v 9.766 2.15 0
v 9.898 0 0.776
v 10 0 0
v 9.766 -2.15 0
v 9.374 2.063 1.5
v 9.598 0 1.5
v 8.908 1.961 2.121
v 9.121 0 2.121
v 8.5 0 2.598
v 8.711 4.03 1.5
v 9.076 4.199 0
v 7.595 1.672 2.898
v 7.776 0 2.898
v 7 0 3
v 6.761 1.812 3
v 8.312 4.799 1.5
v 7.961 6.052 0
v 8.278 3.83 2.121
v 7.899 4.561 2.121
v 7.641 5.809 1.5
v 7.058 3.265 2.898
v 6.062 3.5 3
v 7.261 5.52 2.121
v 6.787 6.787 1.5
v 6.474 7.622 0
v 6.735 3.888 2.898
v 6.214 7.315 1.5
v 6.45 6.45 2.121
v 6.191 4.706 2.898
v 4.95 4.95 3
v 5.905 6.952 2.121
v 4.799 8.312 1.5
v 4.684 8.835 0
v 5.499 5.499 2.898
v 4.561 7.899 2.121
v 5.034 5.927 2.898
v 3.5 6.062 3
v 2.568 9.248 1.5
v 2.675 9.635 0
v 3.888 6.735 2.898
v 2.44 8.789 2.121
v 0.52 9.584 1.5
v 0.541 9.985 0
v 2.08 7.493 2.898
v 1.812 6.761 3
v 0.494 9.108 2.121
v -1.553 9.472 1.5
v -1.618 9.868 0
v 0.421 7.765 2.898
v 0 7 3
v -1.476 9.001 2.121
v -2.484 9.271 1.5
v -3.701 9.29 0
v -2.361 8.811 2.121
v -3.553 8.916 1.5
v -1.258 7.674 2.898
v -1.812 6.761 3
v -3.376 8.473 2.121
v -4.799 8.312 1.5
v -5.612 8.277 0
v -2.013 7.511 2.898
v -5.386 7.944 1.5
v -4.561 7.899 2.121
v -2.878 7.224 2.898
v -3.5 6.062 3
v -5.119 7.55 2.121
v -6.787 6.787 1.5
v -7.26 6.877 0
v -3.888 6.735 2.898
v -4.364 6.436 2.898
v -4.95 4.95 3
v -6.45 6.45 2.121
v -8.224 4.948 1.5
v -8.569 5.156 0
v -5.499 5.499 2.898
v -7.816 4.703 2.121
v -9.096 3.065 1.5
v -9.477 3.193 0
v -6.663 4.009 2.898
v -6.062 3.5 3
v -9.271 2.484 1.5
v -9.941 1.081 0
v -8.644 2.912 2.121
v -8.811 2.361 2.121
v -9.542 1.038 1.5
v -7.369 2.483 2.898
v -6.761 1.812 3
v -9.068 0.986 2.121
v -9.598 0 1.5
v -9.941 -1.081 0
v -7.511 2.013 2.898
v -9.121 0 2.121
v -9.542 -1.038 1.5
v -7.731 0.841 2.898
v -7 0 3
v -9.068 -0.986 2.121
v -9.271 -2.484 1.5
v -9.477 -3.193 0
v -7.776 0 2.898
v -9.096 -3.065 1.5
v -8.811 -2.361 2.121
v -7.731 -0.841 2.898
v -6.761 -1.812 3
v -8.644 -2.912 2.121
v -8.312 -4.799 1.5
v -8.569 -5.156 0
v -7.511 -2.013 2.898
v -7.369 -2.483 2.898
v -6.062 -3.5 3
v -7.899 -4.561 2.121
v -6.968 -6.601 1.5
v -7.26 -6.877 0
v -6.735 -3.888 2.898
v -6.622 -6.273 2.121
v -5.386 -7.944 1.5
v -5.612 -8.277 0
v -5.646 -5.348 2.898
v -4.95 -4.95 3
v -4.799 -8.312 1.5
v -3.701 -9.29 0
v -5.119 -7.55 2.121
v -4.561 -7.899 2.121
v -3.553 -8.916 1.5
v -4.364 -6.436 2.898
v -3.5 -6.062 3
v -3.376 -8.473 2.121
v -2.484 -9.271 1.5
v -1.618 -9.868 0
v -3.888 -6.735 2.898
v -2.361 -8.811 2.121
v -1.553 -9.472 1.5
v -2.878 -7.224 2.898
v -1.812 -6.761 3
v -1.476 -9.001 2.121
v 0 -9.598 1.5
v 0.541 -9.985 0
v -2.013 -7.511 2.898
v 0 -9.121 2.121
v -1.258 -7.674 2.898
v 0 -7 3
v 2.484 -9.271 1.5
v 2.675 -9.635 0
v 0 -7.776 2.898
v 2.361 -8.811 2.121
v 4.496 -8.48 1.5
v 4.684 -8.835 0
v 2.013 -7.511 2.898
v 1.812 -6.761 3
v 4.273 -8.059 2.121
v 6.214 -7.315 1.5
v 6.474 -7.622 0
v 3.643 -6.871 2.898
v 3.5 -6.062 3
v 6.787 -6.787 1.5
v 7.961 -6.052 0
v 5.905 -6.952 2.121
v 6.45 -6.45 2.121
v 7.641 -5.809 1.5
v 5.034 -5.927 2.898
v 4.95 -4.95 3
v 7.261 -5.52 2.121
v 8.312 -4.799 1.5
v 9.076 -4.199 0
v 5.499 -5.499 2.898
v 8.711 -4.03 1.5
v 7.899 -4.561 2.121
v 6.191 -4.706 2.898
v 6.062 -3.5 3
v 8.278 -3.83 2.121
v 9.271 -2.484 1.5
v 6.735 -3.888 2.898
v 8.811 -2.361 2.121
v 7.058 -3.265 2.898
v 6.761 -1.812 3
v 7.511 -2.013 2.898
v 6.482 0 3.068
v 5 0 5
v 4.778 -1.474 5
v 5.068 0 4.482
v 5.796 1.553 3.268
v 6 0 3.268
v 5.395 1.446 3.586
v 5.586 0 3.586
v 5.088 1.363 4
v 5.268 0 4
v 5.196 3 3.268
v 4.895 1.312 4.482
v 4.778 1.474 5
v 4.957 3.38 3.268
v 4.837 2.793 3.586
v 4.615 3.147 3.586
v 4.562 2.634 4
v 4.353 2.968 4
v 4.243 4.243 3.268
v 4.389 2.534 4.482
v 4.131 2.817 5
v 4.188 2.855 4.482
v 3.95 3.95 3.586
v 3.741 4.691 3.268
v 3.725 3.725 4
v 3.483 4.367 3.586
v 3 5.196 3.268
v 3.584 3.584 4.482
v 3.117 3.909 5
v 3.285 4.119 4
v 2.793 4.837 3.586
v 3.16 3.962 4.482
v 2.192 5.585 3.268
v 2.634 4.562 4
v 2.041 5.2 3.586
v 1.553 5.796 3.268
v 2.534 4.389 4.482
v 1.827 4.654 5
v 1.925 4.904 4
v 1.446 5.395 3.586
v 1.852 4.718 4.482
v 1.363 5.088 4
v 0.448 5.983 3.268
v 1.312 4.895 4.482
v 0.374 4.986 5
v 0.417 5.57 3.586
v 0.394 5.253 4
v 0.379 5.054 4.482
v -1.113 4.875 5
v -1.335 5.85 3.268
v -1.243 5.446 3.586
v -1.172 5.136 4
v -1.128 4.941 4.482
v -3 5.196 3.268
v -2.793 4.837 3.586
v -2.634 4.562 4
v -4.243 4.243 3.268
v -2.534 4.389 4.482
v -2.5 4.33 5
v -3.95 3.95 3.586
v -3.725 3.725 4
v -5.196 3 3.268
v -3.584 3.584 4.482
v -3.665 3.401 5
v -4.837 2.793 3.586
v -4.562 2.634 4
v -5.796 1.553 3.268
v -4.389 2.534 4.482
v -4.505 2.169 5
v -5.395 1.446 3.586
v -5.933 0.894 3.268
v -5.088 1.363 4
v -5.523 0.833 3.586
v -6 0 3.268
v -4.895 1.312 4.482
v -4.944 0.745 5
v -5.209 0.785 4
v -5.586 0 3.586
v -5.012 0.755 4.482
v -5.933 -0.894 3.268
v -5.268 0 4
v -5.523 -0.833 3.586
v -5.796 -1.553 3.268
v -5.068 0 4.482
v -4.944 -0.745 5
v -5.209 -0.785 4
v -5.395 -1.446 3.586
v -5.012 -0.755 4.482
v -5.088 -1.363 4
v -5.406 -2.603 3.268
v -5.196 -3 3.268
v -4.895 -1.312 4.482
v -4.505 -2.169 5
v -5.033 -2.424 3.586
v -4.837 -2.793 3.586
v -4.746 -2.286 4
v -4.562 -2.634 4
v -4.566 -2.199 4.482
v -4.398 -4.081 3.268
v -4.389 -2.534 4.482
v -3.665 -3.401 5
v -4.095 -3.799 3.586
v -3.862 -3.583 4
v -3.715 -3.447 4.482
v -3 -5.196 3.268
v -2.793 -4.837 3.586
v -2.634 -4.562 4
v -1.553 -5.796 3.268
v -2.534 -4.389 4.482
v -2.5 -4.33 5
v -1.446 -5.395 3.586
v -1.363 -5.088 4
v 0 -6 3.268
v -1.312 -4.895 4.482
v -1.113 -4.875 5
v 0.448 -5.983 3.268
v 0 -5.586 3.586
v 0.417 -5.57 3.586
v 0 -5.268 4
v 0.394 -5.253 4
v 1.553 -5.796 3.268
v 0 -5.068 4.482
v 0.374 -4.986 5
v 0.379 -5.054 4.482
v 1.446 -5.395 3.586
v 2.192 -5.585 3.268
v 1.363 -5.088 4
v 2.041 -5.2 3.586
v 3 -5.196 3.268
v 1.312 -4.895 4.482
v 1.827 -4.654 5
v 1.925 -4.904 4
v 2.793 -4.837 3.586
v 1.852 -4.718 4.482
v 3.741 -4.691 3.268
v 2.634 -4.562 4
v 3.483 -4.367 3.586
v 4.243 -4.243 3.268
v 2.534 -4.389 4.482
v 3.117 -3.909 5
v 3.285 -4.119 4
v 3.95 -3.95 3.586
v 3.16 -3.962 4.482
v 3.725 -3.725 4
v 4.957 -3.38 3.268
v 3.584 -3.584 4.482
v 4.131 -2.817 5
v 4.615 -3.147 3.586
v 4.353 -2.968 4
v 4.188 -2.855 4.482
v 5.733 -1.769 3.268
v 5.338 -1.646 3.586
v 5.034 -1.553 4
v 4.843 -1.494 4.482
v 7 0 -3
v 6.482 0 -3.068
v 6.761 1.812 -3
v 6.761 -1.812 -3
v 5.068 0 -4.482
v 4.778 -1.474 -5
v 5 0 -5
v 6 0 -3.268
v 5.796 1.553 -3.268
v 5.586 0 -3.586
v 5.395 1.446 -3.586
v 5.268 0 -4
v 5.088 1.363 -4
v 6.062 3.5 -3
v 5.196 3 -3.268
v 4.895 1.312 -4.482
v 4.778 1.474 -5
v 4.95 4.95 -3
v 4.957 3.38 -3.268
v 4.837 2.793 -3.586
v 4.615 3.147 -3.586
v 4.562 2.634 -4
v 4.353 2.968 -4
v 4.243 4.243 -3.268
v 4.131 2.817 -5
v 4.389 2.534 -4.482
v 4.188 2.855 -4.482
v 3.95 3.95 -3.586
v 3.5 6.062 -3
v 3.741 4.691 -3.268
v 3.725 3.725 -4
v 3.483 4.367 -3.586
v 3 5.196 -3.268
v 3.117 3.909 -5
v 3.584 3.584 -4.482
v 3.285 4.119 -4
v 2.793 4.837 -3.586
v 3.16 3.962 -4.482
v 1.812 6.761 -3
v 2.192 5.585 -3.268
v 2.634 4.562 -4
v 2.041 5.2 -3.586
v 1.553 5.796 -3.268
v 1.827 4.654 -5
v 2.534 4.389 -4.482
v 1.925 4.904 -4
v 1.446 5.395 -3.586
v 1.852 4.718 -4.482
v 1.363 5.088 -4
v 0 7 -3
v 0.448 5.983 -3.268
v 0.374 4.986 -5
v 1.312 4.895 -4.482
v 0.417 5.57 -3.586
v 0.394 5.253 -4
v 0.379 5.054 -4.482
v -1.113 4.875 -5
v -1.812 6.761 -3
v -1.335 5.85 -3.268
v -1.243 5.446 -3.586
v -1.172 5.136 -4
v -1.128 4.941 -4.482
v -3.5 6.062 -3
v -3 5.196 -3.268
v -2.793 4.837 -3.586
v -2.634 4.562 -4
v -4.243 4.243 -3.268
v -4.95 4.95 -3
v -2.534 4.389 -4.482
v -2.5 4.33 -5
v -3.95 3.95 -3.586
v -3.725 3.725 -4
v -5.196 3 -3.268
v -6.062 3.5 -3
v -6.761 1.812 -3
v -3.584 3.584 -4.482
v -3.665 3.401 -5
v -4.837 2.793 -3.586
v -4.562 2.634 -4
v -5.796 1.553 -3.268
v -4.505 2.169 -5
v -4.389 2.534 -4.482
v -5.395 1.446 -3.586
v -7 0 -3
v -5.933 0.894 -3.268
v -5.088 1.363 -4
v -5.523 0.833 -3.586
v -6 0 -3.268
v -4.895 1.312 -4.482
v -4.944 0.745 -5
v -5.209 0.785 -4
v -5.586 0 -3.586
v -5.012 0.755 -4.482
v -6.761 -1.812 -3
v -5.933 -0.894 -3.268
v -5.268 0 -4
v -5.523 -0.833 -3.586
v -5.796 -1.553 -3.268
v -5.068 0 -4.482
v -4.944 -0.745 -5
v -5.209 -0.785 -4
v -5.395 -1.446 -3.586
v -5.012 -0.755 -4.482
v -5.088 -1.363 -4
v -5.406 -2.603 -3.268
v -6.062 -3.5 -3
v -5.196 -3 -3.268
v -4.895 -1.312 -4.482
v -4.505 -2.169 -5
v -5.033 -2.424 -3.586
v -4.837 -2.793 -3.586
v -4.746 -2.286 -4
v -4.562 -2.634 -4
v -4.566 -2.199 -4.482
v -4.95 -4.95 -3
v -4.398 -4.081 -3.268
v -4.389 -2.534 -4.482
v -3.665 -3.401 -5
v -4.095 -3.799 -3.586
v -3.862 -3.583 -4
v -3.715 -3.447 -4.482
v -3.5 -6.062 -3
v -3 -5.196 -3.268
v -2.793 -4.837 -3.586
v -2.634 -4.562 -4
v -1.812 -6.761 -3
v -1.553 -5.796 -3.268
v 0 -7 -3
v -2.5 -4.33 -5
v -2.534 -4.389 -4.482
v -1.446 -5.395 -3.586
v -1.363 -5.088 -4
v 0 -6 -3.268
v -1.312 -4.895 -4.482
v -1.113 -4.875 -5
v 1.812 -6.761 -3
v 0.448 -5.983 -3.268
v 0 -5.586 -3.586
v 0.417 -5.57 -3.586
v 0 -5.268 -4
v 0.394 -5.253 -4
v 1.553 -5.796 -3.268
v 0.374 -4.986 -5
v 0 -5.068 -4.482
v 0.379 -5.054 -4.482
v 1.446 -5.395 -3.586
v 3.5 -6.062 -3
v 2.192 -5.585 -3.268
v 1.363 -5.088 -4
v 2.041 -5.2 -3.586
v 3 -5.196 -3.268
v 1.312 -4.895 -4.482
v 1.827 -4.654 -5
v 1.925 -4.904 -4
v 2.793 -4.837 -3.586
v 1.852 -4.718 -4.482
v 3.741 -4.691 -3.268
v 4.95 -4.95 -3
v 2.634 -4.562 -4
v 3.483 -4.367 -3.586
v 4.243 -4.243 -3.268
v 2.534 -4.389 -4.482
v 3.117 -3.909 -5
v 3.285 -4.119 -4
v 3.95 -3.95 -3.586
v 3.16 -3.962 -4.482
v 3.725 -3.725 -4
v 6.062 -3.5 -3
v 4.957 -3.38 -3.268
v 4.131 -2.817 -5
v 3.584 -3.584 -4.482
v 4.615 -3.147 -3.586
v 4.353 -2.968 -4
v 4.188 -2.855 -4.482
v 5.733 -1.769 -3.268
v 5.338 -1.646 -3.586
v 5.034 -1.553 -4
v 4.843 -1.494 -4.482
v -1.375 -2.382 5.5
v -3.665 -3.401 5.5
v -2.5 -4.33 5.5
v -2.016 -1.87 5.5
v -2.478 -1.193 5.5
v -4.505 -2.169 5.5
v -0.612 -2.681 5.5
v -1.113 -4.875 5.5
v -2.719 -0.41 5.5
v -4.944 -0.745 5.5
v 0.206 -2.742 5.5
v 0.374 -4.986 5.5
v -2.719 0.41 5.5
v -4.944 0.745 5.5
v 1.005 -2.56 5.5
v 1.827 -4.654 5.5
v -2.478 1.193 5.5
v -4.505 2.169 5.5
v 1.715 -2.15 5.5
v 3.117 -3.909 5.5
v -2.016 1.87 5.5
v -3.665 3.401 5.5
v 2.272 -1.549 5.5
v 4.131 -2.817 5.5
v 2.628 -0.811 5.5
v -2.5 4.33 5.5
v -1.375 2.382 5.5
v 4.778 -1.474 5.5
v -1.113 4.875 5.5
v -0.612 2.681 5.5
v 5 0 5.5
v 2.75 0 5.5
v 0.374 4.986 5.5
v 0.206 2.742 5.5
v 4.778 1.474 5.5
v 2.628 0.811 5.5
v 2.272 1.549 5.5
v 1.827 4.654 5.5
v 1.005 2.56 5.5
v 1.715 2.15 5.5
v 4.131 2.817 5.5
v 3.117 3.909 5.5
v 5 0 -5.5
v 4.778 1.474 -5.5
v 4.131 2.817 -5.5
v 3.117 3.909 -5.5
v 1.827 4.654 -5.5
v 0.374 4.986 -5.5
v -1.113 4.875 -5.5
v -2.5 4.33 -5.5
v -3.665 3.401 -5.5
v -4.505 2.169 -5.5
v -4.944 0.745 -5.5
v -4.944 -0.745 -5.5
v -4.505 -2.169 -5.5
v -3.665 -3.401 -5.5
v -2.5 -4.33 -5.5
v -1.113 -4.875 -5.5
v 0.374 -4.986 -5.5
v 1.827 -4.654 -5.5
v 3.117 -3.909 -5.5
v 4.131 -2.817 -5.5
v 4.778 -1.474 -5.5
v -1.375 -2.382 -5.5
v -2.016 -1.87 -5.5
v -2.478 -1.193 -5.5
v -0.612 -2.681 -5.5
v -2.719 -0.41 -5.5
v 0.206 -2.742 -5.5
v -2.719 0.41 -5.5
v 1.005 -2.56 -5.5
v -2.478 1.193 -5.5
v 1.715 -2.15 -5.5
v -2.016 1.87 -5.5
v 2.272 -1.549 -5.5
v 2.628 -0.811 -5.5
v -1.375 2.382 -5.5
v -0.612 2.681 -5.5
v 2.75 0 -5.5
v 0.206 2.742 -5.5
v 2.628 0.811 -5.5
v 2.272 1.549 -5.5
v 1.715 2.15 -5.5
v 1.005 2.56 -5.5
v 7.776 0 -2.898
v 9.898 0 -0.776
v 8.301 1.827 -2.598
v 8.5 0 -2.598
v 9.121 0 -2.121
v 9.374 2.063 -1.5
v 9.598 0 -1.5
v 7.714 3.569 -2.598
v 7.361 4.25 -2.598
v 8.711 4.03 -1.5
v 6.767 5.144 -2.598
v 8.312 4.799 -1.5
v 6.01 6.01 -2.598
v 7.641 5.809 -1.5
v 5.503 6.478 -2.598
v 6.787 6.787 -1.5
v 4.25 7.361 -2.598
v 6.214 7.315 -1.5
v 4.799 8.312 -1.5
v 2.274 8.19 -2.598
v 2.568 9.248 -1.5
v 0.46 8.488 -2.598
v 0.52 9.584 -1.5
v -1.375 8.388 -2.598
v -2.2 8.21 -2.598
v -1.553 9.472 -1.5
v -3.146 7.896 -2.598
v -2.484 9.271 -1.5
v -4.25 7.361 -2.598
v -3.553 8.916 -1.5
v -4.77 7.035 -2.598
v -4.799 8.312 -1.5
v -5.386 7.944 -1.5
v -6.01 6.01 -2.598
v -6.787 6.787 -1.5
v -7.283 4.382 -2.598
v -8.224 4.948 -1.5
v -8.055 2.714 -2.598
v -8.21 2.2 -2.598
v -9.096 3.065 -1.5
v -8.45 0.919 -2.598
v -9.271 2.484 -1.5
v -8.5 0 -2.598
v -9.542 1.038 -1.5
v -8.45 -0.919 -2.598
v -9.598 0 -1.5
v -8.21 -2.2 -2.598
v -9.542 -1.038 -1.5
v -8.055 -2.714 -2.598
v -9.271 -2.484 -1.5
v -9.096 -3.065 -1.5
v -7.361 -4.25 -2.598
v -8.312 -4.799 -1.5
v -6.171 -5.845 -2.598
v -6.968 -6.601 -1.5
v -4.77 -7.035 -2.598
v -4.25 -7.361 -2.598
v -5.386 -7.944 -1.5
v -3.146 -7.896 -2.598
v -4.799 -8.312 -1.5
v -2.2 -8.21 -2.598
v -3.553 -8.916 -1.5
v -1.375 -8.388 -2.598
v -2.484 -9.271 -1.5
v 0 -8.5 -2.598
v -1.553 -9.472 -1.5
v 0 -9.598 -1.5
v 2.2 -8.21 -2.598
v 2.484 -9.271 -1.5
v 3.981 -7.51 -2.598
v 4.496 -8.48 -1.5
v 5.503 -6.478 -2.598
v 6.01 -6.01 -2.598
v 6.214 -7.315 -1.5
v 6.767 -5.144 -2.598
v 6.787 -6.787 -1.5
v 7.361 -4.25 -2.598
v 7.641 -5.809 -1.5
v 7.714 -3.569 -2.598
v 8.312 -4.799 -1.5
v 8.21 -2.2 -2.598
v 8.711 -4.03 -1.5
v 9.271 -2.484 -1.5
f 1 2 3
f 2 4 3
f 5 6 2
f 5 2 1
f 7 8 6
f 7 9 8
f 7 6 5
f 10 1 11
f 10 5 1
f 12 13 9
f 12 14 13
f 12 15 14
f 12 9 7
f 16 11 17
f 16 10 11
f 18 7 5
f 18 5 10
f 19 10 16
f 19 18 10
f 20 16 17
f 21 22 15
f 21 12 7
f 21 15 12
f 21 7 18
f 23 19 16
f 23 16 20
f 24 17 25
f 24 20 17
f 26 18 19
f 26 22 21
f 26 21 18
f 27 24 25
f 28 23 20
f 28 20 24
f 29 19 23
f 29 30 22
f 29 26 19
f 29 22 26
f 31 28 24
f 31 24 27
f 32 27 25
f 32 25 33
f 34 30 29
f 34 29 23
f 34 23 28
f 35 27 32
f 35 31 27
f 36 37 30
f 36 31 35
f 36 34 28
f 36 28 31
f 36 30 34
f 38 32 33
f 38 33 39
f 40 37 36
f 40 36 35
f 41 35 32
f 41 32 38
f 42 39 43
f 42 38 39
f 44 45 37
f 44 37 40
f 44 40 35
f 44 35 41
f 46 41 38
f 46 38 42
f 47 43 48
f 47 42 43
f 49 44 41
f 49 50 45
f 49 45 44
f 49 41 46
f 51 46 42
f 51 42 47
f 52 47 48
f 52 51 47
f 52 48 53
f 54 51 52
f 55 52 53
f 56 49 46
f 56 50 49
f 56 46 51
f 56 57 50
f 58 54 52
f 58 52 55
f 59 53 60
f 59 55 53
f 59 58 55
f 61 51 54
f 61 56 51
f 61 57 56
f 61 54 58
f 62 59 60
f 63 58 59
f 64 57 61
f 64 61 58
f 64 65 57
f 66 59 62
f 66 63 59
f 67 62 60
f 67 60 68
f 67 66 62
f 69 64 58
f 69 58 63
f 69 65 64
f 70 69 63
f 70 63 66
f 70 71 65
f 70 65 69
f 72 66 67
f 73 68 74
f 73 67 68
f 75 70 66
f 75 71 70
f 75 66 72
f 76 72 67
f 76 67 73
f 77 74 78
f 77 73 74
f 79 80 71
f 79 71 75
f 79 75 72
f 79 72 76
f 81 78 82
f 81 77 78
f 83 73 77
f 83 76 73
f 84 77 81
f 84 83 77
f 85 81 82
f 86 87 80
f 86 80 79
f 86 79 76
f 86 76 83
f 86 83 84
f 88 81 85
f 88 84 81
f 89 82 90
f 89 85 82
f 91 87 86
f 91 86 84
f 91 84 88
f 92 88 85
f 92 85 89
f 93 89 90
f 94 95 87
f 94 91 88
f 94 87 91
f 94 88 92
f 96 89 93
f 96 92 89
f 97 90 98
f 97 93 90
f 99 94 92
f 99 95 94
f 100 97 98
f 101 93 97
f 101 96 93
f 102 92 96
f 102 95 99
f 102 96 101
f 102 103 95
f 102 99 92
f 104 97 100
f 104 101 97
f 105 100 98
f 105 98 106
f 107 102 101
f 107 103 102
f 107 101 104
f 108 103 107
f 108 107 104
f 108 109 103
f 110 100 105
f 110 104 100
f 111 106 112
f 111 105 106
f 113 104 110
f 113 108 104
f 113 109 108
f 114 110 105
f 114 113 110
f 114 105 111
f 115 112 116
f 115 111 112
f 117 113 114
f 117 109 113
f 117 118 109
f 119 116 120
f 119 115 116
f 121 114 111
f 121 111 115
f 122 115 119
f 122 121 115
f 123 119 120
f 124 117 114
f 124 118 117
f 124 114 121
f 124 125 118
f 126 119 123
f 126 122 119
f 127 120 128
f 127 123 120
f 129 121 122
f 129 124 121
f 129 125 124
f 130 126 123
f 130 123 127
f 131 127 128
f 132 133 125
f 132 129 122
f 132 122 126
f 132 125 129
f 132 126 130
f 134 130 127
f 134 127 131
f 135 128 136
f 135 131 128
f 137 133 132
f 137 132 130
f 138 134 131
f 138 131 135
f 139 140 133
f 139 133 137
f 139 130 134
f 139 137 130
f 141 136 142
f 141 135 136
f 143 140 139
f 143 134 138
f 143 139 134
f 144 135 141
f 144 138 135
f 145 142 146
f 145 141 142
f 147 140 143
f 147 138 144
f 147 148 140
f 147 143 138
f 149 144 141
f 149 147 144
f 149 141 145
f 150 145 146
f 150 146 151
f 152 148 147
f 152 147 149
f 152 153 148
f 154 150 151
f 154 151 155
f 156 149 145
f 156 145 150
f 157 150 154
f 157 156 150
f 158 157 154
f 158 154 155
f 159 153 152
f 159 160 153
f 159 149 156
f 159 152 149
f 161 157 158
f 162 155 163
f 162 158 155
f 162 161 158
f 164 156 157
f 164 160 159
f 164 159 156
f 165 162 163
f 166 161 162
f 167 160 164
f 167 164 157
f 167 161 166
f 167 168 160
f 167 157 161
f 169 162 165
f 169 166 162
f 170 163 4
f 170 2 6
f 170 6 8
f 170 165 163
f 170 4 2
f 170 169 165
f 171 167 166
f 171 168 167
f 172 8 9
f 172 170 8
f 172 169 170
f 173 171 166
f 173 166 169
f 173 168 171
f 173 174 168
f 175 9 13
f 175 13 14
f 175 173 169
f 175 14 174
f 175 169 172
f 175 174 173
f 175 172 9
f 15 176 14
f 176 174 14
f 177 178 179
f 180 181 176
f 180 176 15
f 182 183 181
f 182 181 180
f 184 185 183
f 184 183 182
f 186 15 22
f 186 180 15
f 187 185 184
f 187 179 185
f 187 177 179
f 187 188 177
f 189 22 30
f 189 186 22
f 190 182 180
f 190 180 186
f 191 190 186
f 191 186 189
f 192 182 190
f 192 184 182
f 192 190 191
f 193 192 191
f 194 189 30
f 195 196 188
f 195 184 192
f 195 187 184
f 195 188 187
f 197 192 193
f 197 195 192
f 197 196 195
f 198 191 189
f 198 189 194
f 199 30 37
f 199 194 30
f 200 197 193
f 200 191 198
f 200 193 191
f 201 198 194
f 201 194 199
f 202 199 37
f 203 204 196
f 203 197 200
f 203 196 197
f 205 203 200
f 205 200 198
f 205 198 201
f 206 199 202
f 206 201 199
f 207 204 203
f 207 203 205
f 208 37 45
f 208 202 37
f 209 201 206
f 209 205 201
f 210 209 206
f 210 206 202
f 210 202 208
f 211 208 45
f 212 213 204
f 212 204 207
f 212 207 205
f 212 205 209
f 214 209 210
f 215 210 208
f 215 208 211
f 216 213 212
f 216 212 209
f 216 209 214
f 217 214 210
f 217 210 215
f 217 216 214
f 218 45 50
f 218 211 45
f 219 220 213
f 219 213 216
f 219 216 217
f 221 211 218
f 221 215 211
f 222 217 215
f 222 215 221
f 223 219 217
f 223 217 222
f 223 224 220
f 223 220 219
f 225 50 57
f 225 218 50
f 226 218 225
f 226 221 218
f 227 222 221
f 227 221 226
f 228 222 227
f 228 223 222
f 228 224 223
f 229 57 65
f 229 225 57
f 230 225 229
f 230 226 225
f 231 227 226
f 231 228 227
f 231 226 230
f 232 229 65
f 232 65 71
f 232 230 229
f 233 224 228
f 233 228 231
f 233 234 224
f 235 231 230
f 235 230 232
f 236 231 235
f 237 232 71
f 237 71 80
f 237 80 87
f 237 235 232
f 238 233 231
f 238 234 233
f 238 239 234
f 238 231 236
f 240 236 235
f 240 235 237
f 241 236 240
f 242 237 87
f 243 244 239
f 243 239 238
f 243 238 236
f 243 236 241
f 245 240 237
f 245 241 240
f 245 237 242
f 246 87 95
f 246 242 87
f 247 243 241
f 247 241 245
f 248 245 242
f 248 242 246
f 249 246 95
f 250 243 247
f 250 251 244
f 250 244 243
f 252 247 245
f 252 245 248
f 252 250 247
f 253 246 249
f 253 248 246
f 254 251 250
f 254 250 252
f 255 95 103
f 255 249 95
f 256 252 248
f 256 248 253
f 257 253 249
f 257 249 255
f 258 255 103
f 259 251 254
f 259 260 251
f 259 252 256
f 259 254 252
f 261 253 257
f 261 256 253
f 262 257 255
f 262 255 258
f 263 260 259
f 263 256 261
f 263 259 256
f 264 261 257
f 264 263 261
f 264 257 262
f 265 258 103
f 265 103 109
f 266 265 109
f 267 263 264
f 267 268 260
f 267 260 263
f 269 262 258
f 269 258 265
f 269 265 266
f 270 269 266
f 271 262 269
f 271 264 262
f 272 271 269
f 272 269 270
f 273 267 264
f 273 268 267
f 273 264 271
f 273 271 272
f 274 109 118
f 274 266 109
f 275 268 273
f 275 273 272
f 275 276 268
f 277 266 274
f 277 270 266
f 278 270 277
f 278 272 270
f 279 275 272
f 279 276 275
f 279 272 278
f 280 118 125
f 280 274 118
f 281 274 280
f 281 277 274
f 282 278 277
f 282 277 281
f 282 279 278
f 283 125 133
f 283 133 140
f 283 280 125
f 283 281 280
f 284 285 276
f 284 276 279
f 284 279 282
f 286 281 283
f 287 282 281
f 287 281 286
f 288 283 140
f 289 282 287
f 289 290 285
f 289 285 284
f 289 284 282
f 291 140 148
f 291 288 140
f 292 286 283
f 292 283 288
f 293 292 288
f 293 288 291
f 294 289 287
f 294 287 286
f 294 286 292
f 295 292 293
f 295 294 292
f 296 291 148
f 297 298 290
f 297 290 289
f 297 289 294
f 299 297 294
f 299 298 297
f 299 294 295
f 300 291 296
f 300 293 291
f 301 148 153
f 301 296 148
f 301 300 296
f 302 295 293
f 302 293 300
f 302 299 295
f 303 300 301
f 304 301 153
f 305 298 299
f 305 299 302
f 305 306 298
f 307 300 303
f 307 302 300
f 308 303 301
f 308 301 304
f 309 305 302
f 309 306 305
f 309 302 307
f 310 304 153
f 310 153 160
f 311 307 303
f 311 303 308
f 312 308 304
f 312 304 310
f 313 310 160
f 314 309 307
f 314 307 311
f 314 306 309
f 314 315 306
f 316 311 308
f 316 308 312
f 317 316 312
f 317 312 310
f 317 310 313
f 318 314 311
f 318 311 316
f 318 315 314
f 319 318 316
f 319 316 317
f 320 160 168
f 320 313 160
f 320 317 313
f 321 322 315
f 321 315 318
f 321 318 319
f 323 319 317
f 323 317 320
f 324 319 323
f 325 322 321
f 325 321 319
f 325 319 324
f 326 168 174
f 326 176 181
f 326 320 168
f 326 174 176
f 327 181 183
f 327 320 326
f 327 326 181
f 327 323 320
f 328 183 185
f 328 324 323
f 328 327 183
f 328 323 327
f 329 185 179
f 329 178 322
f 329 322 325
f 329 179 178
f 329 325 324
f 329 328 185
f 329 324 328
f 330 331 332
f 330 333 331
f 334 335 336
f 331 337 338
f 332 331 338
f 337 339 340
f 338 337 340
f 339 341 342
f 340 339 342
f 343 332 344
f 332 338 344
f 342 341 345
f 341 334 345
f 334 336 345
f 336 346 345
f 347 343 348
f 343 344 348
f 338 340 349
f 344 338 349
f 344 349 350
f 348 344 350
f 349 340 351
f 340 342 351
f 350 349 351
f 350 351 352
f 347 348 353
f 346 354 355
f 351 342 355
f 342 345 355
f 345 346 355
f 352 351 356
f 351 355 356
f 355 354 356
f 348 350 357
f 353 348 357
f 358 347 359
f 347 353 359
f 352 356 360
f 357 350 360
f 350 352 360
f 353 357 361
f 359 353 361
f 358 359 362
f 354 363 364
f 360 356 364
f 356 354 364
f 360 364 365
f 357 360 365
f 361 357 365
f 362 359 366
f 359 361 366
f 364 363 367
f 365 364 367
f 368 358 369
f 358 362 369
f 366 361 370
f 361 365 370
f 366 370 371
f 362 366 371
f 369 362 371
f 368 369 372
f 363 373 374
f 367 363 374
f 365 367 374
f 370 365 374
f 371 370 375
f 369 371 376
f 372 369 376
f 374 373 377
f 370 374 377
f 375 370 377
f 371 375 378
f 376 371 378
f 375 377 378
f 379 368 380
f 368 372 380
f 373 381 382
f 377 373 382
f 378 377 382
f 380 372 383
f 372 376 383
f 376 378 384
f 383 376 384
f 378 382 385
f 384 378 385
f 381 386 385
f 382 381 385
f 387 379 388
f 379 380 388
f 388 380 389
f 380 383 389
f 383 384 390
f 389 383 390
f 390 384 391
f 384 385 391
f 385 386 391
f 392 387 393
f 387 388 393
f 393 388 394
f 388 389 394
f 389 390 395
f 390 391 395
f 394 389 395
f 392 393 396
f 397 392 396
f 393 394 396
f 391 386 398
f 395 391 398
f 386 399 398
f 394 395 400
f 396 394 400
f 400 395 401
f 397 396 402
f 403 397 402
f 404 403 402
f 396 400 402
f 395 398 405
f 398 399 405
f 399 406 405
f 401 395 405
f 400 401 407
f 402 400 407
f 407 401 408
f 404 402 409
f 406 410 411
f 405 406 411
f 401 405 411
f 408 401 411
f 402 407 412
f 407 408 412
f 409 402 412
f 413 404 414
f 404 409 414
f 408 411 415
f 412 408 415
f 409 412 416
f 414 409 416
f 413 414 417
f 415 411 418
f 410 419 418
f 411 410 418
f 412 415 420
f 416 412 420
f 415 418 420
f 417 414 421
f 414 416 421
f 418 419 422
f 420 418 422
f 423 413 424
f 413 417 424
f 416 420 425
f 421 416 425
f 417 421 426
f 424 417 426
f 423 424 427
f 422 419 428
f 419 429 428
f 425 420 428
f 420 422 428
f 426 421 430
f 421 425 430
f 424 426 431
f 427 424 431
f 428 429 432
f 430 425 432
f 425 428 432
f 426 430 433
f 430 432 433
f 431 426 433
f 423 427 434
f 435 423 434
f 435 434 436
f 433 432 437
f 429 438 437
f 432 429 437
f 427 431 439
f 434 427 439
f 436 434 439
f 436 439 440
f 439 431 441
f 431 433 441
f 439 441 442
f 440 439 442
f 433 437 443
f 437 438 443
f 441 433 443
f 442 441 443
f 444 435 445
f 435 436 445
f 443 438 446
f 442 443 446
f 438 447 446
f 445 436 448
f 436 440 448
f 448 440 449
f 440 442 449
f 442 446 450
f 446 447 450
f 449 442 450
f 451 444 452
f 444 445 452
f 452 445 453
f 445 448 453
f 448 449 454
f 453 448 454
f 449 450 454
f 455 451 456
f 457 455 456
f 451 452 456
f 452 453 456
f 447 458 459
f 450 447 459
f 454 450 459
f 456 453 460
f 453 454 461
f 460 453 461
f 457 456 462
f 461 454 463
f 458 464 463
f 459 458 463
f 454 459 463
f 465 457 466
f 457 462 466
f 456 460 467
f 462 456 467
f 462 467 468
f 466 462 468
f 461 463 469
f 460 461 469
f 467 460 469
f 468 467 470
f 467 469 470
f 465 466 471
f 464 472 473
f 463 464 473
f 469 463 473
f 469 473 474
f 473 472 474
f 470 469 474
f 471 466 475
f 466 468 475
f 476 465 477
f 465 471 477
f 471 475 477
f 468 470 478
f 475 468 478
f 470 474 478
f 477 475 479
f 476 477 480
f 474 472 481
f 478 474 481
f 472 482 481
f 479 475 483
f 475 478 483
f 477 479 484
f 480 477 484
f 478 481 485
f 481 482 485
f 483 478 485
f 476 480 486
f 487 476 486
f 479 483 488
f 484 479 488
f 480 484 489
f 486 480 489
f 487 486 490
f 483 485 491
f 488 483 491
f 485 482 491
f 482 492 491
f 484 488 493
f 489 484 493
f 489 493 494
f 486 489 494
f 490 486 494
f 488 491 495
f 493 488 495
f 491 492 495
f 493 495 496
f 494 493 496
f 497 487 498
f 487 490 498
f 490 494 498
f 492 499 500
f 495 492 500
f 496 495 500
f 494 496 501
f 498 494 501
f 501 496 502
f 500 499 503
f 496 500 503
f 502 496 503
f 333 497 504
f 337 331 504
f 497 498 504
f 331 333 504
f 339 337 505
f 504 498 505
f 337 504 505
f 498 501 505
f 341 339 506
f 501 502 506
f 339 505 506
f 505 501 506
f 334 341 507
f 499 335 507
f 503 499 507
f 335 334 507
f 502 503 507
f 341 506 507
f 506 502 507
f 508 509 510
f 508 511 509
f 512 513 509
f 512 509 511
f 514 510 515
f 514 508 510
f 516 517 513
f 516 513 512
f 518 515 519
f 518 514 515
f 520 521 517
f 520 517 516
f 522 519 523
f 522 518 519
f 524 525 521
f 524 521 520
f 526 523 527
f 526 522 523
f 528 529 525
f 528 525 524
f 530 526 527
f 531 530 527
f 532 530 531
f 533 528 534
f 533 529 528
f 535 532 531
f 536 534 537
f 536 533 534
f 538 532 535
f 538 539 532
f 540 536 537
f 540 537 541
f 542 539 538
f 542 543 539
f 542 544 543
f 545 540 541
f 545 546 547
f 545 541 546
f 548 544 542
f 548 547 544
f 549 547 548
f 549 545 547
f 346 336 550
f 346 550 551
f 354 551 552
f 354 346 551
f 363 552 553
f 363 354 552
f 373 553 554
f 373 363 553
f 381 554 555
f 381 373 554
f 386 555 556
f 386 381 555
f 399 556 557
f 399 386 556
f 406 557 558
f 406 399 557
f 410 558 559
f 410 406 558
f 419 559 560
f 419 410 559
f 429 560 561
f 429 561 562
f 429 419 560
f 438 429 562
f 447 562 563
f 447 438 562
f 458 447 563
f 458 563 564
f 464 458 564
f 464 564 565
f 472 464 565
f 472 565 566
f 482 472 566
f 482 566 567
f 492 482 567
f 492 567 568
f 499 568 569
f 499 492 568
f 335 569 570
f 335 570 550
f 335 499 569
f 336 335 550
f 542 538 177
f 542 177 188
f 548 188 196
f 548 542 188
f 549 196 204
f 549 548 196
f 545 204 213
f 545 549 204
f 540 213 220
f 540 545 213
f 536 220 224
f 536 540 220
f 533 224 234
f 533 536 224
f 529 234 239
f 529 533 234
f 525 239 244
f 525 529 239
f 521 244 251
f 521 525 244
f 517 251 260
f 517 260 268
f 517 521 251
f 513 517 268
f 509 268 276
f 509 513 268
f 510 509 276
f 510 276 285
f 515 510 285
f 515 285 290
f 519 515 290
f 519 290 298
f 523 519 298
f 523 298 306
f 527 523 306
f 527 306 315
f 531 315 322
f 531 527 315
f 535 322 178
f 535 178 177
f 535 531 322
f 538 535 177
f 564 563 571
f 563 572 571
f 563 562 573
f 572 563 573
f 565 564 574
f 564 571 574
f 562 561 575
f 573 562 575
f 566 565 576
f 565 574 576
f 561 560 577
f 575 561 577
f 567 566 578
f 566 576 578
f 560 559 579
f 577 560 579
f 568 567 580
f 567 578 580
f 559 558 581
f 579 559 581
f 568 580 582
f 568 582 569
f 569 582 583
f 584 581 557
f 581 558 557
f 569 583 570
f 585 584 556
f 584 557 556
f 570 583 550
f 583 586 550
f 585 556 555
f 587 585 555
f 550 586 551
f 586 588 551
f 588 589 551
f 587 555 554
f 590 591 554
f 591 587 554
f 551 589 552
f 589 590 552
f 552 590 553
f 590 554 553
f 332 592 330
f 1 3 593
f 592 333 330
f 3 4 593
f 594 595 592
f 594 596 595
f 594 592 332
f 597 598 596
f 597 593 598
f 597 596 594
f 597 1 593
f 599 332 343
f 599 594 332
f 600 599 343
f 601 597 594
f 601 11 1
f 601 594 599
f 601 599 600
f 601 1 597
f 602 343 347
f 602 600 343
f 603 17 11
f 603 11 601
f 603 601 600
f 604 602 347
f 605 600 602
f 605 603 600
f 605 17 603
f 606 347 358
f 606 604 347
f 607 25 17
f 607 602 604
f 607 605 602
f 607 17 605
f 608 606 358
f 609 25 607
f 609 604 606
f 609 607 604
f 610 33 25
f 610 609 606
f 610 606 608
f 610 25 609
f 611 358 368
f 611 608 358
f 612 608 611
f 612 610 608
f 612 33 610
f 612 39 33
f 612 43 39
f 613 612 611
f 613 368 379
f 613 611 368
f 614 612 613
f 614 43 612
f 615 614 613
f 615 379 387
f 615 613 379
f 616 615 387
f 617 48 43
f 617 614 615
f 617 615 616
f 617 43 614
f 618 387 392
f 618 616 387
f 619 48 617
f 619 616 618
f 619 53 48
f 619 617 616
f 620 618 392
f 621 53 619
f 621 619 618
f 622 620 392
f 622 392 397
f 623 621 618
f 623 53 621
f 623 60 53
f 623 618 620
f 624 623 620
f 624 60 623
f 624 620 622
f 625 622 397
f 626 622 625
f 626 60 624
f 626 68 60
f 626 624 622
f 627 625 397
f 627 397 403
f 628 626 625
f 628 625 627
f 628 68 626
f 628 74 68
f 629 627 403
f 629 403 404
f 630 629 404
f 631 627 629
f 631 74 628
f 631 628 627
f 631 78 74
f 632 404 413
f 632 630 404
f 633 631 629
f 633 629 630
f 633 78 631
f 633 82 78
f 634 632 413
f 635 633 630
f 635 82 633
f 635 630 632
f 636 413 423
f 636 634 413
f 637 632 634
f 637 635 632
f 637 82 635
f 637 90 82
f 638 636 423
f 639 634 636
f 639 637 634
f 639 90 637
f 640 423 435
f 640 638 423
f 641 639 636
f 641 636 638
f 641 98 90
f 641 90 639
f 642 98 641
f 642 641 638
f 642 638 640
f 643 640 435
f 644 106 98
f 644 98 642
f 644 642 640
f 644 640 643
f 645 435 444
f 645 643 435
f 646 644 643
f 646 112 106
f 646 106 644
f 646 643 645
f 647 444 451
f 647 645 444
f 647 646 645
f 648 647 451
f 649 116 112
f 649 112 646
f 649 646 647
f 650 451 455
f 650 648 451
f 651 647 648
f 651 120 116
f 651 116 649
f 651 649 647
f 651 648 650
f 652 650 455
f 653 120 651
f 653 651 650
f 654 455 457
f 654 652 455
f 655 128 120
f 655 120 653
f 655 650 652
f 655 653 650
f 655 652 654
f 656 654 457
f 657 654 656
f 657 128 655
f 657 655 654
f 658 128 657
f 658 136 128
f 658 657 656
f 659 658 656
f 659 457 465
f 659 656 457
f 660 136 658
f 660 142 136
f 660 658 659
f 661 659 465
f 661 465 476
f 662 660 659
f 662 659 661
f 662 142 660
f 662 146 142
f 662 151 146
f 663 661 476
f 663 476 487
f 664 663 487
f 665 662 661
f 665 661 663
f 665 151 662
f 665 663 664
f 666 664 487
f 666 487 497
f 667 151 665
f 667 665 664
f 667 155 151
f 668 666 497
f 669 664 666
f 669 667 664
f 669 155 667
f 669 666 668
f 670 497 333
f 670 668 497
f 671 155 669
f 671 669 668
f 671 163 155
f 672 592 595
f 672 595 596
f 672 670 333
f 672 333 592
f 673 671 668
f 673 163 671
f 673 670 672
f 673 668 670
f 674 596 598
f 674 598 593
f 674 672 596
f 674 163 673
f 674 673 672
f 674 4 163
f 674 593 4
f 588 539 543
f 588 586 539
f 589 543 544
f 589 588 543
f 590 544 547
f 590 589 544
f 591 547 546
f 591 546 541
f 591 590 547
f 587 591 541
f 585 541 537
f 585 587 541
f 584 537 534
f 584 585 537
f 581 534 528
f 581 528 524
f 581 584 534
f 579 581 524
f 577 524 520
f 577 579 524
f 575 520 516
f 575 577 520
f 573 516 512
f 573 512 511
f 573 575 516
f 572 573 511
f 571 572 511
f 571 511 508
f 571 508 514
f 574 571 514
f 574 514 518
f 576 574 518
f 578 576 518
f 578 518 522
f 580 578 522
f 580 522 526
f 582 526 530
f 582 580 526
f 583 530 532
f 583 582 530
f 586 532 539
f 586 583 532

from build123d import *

# Parameters (mm, degrees)
F0_R     = 5
F0_R_2   = 2.75
F1_DEPTH = 5.5
F0_R_3   = 10
F2_DEPTH = 3
F3_R     = 2.99999
F4_R     = 2


# Not quite as in the source:
# - a fillet or chamfer is up to 0.001 mm smaller than in the source, because OpenCascade refuses the exact size


with BuildPart() as f1:
    # F0 (on Top) → F1 (new body, symmetric)
    with BuildSketch(Plane.XY):
        Circle(F0_R)
        Circle(F0_R_2, mode=Mode.SUBTRACT)
    extrude(amount=F1_DEPTH, both=True)

    # F0 (on Top) → F2 (join, symmetric)
    with BuildSketch(Plane.XY):
        Circle(F0_R_3)
        Circle(F0_R, mode=Mode.SUBTRACT)
    extrude(amount=F2_DEPTH, both=True)

    # F3 (radius 3 in the source; OpenCascade refuses exactly that, so slightly less here)
    f3_edges = [f1.edges().sort_by_distance(p)[0] for p in [
        (-10, 0, 3),
        (-10, 0, -3),
    ]]
    fillet(f3_edges, radius=F3_R)

    # F4
    f4_edges = [f1.edges().sort_by_distance(p)[0] for p in [
        (-5, 0, 3),
        (-5, 0, -3),
    ]]
    fillet(f4_edges, radius=F4_R)


solid = f1.part
